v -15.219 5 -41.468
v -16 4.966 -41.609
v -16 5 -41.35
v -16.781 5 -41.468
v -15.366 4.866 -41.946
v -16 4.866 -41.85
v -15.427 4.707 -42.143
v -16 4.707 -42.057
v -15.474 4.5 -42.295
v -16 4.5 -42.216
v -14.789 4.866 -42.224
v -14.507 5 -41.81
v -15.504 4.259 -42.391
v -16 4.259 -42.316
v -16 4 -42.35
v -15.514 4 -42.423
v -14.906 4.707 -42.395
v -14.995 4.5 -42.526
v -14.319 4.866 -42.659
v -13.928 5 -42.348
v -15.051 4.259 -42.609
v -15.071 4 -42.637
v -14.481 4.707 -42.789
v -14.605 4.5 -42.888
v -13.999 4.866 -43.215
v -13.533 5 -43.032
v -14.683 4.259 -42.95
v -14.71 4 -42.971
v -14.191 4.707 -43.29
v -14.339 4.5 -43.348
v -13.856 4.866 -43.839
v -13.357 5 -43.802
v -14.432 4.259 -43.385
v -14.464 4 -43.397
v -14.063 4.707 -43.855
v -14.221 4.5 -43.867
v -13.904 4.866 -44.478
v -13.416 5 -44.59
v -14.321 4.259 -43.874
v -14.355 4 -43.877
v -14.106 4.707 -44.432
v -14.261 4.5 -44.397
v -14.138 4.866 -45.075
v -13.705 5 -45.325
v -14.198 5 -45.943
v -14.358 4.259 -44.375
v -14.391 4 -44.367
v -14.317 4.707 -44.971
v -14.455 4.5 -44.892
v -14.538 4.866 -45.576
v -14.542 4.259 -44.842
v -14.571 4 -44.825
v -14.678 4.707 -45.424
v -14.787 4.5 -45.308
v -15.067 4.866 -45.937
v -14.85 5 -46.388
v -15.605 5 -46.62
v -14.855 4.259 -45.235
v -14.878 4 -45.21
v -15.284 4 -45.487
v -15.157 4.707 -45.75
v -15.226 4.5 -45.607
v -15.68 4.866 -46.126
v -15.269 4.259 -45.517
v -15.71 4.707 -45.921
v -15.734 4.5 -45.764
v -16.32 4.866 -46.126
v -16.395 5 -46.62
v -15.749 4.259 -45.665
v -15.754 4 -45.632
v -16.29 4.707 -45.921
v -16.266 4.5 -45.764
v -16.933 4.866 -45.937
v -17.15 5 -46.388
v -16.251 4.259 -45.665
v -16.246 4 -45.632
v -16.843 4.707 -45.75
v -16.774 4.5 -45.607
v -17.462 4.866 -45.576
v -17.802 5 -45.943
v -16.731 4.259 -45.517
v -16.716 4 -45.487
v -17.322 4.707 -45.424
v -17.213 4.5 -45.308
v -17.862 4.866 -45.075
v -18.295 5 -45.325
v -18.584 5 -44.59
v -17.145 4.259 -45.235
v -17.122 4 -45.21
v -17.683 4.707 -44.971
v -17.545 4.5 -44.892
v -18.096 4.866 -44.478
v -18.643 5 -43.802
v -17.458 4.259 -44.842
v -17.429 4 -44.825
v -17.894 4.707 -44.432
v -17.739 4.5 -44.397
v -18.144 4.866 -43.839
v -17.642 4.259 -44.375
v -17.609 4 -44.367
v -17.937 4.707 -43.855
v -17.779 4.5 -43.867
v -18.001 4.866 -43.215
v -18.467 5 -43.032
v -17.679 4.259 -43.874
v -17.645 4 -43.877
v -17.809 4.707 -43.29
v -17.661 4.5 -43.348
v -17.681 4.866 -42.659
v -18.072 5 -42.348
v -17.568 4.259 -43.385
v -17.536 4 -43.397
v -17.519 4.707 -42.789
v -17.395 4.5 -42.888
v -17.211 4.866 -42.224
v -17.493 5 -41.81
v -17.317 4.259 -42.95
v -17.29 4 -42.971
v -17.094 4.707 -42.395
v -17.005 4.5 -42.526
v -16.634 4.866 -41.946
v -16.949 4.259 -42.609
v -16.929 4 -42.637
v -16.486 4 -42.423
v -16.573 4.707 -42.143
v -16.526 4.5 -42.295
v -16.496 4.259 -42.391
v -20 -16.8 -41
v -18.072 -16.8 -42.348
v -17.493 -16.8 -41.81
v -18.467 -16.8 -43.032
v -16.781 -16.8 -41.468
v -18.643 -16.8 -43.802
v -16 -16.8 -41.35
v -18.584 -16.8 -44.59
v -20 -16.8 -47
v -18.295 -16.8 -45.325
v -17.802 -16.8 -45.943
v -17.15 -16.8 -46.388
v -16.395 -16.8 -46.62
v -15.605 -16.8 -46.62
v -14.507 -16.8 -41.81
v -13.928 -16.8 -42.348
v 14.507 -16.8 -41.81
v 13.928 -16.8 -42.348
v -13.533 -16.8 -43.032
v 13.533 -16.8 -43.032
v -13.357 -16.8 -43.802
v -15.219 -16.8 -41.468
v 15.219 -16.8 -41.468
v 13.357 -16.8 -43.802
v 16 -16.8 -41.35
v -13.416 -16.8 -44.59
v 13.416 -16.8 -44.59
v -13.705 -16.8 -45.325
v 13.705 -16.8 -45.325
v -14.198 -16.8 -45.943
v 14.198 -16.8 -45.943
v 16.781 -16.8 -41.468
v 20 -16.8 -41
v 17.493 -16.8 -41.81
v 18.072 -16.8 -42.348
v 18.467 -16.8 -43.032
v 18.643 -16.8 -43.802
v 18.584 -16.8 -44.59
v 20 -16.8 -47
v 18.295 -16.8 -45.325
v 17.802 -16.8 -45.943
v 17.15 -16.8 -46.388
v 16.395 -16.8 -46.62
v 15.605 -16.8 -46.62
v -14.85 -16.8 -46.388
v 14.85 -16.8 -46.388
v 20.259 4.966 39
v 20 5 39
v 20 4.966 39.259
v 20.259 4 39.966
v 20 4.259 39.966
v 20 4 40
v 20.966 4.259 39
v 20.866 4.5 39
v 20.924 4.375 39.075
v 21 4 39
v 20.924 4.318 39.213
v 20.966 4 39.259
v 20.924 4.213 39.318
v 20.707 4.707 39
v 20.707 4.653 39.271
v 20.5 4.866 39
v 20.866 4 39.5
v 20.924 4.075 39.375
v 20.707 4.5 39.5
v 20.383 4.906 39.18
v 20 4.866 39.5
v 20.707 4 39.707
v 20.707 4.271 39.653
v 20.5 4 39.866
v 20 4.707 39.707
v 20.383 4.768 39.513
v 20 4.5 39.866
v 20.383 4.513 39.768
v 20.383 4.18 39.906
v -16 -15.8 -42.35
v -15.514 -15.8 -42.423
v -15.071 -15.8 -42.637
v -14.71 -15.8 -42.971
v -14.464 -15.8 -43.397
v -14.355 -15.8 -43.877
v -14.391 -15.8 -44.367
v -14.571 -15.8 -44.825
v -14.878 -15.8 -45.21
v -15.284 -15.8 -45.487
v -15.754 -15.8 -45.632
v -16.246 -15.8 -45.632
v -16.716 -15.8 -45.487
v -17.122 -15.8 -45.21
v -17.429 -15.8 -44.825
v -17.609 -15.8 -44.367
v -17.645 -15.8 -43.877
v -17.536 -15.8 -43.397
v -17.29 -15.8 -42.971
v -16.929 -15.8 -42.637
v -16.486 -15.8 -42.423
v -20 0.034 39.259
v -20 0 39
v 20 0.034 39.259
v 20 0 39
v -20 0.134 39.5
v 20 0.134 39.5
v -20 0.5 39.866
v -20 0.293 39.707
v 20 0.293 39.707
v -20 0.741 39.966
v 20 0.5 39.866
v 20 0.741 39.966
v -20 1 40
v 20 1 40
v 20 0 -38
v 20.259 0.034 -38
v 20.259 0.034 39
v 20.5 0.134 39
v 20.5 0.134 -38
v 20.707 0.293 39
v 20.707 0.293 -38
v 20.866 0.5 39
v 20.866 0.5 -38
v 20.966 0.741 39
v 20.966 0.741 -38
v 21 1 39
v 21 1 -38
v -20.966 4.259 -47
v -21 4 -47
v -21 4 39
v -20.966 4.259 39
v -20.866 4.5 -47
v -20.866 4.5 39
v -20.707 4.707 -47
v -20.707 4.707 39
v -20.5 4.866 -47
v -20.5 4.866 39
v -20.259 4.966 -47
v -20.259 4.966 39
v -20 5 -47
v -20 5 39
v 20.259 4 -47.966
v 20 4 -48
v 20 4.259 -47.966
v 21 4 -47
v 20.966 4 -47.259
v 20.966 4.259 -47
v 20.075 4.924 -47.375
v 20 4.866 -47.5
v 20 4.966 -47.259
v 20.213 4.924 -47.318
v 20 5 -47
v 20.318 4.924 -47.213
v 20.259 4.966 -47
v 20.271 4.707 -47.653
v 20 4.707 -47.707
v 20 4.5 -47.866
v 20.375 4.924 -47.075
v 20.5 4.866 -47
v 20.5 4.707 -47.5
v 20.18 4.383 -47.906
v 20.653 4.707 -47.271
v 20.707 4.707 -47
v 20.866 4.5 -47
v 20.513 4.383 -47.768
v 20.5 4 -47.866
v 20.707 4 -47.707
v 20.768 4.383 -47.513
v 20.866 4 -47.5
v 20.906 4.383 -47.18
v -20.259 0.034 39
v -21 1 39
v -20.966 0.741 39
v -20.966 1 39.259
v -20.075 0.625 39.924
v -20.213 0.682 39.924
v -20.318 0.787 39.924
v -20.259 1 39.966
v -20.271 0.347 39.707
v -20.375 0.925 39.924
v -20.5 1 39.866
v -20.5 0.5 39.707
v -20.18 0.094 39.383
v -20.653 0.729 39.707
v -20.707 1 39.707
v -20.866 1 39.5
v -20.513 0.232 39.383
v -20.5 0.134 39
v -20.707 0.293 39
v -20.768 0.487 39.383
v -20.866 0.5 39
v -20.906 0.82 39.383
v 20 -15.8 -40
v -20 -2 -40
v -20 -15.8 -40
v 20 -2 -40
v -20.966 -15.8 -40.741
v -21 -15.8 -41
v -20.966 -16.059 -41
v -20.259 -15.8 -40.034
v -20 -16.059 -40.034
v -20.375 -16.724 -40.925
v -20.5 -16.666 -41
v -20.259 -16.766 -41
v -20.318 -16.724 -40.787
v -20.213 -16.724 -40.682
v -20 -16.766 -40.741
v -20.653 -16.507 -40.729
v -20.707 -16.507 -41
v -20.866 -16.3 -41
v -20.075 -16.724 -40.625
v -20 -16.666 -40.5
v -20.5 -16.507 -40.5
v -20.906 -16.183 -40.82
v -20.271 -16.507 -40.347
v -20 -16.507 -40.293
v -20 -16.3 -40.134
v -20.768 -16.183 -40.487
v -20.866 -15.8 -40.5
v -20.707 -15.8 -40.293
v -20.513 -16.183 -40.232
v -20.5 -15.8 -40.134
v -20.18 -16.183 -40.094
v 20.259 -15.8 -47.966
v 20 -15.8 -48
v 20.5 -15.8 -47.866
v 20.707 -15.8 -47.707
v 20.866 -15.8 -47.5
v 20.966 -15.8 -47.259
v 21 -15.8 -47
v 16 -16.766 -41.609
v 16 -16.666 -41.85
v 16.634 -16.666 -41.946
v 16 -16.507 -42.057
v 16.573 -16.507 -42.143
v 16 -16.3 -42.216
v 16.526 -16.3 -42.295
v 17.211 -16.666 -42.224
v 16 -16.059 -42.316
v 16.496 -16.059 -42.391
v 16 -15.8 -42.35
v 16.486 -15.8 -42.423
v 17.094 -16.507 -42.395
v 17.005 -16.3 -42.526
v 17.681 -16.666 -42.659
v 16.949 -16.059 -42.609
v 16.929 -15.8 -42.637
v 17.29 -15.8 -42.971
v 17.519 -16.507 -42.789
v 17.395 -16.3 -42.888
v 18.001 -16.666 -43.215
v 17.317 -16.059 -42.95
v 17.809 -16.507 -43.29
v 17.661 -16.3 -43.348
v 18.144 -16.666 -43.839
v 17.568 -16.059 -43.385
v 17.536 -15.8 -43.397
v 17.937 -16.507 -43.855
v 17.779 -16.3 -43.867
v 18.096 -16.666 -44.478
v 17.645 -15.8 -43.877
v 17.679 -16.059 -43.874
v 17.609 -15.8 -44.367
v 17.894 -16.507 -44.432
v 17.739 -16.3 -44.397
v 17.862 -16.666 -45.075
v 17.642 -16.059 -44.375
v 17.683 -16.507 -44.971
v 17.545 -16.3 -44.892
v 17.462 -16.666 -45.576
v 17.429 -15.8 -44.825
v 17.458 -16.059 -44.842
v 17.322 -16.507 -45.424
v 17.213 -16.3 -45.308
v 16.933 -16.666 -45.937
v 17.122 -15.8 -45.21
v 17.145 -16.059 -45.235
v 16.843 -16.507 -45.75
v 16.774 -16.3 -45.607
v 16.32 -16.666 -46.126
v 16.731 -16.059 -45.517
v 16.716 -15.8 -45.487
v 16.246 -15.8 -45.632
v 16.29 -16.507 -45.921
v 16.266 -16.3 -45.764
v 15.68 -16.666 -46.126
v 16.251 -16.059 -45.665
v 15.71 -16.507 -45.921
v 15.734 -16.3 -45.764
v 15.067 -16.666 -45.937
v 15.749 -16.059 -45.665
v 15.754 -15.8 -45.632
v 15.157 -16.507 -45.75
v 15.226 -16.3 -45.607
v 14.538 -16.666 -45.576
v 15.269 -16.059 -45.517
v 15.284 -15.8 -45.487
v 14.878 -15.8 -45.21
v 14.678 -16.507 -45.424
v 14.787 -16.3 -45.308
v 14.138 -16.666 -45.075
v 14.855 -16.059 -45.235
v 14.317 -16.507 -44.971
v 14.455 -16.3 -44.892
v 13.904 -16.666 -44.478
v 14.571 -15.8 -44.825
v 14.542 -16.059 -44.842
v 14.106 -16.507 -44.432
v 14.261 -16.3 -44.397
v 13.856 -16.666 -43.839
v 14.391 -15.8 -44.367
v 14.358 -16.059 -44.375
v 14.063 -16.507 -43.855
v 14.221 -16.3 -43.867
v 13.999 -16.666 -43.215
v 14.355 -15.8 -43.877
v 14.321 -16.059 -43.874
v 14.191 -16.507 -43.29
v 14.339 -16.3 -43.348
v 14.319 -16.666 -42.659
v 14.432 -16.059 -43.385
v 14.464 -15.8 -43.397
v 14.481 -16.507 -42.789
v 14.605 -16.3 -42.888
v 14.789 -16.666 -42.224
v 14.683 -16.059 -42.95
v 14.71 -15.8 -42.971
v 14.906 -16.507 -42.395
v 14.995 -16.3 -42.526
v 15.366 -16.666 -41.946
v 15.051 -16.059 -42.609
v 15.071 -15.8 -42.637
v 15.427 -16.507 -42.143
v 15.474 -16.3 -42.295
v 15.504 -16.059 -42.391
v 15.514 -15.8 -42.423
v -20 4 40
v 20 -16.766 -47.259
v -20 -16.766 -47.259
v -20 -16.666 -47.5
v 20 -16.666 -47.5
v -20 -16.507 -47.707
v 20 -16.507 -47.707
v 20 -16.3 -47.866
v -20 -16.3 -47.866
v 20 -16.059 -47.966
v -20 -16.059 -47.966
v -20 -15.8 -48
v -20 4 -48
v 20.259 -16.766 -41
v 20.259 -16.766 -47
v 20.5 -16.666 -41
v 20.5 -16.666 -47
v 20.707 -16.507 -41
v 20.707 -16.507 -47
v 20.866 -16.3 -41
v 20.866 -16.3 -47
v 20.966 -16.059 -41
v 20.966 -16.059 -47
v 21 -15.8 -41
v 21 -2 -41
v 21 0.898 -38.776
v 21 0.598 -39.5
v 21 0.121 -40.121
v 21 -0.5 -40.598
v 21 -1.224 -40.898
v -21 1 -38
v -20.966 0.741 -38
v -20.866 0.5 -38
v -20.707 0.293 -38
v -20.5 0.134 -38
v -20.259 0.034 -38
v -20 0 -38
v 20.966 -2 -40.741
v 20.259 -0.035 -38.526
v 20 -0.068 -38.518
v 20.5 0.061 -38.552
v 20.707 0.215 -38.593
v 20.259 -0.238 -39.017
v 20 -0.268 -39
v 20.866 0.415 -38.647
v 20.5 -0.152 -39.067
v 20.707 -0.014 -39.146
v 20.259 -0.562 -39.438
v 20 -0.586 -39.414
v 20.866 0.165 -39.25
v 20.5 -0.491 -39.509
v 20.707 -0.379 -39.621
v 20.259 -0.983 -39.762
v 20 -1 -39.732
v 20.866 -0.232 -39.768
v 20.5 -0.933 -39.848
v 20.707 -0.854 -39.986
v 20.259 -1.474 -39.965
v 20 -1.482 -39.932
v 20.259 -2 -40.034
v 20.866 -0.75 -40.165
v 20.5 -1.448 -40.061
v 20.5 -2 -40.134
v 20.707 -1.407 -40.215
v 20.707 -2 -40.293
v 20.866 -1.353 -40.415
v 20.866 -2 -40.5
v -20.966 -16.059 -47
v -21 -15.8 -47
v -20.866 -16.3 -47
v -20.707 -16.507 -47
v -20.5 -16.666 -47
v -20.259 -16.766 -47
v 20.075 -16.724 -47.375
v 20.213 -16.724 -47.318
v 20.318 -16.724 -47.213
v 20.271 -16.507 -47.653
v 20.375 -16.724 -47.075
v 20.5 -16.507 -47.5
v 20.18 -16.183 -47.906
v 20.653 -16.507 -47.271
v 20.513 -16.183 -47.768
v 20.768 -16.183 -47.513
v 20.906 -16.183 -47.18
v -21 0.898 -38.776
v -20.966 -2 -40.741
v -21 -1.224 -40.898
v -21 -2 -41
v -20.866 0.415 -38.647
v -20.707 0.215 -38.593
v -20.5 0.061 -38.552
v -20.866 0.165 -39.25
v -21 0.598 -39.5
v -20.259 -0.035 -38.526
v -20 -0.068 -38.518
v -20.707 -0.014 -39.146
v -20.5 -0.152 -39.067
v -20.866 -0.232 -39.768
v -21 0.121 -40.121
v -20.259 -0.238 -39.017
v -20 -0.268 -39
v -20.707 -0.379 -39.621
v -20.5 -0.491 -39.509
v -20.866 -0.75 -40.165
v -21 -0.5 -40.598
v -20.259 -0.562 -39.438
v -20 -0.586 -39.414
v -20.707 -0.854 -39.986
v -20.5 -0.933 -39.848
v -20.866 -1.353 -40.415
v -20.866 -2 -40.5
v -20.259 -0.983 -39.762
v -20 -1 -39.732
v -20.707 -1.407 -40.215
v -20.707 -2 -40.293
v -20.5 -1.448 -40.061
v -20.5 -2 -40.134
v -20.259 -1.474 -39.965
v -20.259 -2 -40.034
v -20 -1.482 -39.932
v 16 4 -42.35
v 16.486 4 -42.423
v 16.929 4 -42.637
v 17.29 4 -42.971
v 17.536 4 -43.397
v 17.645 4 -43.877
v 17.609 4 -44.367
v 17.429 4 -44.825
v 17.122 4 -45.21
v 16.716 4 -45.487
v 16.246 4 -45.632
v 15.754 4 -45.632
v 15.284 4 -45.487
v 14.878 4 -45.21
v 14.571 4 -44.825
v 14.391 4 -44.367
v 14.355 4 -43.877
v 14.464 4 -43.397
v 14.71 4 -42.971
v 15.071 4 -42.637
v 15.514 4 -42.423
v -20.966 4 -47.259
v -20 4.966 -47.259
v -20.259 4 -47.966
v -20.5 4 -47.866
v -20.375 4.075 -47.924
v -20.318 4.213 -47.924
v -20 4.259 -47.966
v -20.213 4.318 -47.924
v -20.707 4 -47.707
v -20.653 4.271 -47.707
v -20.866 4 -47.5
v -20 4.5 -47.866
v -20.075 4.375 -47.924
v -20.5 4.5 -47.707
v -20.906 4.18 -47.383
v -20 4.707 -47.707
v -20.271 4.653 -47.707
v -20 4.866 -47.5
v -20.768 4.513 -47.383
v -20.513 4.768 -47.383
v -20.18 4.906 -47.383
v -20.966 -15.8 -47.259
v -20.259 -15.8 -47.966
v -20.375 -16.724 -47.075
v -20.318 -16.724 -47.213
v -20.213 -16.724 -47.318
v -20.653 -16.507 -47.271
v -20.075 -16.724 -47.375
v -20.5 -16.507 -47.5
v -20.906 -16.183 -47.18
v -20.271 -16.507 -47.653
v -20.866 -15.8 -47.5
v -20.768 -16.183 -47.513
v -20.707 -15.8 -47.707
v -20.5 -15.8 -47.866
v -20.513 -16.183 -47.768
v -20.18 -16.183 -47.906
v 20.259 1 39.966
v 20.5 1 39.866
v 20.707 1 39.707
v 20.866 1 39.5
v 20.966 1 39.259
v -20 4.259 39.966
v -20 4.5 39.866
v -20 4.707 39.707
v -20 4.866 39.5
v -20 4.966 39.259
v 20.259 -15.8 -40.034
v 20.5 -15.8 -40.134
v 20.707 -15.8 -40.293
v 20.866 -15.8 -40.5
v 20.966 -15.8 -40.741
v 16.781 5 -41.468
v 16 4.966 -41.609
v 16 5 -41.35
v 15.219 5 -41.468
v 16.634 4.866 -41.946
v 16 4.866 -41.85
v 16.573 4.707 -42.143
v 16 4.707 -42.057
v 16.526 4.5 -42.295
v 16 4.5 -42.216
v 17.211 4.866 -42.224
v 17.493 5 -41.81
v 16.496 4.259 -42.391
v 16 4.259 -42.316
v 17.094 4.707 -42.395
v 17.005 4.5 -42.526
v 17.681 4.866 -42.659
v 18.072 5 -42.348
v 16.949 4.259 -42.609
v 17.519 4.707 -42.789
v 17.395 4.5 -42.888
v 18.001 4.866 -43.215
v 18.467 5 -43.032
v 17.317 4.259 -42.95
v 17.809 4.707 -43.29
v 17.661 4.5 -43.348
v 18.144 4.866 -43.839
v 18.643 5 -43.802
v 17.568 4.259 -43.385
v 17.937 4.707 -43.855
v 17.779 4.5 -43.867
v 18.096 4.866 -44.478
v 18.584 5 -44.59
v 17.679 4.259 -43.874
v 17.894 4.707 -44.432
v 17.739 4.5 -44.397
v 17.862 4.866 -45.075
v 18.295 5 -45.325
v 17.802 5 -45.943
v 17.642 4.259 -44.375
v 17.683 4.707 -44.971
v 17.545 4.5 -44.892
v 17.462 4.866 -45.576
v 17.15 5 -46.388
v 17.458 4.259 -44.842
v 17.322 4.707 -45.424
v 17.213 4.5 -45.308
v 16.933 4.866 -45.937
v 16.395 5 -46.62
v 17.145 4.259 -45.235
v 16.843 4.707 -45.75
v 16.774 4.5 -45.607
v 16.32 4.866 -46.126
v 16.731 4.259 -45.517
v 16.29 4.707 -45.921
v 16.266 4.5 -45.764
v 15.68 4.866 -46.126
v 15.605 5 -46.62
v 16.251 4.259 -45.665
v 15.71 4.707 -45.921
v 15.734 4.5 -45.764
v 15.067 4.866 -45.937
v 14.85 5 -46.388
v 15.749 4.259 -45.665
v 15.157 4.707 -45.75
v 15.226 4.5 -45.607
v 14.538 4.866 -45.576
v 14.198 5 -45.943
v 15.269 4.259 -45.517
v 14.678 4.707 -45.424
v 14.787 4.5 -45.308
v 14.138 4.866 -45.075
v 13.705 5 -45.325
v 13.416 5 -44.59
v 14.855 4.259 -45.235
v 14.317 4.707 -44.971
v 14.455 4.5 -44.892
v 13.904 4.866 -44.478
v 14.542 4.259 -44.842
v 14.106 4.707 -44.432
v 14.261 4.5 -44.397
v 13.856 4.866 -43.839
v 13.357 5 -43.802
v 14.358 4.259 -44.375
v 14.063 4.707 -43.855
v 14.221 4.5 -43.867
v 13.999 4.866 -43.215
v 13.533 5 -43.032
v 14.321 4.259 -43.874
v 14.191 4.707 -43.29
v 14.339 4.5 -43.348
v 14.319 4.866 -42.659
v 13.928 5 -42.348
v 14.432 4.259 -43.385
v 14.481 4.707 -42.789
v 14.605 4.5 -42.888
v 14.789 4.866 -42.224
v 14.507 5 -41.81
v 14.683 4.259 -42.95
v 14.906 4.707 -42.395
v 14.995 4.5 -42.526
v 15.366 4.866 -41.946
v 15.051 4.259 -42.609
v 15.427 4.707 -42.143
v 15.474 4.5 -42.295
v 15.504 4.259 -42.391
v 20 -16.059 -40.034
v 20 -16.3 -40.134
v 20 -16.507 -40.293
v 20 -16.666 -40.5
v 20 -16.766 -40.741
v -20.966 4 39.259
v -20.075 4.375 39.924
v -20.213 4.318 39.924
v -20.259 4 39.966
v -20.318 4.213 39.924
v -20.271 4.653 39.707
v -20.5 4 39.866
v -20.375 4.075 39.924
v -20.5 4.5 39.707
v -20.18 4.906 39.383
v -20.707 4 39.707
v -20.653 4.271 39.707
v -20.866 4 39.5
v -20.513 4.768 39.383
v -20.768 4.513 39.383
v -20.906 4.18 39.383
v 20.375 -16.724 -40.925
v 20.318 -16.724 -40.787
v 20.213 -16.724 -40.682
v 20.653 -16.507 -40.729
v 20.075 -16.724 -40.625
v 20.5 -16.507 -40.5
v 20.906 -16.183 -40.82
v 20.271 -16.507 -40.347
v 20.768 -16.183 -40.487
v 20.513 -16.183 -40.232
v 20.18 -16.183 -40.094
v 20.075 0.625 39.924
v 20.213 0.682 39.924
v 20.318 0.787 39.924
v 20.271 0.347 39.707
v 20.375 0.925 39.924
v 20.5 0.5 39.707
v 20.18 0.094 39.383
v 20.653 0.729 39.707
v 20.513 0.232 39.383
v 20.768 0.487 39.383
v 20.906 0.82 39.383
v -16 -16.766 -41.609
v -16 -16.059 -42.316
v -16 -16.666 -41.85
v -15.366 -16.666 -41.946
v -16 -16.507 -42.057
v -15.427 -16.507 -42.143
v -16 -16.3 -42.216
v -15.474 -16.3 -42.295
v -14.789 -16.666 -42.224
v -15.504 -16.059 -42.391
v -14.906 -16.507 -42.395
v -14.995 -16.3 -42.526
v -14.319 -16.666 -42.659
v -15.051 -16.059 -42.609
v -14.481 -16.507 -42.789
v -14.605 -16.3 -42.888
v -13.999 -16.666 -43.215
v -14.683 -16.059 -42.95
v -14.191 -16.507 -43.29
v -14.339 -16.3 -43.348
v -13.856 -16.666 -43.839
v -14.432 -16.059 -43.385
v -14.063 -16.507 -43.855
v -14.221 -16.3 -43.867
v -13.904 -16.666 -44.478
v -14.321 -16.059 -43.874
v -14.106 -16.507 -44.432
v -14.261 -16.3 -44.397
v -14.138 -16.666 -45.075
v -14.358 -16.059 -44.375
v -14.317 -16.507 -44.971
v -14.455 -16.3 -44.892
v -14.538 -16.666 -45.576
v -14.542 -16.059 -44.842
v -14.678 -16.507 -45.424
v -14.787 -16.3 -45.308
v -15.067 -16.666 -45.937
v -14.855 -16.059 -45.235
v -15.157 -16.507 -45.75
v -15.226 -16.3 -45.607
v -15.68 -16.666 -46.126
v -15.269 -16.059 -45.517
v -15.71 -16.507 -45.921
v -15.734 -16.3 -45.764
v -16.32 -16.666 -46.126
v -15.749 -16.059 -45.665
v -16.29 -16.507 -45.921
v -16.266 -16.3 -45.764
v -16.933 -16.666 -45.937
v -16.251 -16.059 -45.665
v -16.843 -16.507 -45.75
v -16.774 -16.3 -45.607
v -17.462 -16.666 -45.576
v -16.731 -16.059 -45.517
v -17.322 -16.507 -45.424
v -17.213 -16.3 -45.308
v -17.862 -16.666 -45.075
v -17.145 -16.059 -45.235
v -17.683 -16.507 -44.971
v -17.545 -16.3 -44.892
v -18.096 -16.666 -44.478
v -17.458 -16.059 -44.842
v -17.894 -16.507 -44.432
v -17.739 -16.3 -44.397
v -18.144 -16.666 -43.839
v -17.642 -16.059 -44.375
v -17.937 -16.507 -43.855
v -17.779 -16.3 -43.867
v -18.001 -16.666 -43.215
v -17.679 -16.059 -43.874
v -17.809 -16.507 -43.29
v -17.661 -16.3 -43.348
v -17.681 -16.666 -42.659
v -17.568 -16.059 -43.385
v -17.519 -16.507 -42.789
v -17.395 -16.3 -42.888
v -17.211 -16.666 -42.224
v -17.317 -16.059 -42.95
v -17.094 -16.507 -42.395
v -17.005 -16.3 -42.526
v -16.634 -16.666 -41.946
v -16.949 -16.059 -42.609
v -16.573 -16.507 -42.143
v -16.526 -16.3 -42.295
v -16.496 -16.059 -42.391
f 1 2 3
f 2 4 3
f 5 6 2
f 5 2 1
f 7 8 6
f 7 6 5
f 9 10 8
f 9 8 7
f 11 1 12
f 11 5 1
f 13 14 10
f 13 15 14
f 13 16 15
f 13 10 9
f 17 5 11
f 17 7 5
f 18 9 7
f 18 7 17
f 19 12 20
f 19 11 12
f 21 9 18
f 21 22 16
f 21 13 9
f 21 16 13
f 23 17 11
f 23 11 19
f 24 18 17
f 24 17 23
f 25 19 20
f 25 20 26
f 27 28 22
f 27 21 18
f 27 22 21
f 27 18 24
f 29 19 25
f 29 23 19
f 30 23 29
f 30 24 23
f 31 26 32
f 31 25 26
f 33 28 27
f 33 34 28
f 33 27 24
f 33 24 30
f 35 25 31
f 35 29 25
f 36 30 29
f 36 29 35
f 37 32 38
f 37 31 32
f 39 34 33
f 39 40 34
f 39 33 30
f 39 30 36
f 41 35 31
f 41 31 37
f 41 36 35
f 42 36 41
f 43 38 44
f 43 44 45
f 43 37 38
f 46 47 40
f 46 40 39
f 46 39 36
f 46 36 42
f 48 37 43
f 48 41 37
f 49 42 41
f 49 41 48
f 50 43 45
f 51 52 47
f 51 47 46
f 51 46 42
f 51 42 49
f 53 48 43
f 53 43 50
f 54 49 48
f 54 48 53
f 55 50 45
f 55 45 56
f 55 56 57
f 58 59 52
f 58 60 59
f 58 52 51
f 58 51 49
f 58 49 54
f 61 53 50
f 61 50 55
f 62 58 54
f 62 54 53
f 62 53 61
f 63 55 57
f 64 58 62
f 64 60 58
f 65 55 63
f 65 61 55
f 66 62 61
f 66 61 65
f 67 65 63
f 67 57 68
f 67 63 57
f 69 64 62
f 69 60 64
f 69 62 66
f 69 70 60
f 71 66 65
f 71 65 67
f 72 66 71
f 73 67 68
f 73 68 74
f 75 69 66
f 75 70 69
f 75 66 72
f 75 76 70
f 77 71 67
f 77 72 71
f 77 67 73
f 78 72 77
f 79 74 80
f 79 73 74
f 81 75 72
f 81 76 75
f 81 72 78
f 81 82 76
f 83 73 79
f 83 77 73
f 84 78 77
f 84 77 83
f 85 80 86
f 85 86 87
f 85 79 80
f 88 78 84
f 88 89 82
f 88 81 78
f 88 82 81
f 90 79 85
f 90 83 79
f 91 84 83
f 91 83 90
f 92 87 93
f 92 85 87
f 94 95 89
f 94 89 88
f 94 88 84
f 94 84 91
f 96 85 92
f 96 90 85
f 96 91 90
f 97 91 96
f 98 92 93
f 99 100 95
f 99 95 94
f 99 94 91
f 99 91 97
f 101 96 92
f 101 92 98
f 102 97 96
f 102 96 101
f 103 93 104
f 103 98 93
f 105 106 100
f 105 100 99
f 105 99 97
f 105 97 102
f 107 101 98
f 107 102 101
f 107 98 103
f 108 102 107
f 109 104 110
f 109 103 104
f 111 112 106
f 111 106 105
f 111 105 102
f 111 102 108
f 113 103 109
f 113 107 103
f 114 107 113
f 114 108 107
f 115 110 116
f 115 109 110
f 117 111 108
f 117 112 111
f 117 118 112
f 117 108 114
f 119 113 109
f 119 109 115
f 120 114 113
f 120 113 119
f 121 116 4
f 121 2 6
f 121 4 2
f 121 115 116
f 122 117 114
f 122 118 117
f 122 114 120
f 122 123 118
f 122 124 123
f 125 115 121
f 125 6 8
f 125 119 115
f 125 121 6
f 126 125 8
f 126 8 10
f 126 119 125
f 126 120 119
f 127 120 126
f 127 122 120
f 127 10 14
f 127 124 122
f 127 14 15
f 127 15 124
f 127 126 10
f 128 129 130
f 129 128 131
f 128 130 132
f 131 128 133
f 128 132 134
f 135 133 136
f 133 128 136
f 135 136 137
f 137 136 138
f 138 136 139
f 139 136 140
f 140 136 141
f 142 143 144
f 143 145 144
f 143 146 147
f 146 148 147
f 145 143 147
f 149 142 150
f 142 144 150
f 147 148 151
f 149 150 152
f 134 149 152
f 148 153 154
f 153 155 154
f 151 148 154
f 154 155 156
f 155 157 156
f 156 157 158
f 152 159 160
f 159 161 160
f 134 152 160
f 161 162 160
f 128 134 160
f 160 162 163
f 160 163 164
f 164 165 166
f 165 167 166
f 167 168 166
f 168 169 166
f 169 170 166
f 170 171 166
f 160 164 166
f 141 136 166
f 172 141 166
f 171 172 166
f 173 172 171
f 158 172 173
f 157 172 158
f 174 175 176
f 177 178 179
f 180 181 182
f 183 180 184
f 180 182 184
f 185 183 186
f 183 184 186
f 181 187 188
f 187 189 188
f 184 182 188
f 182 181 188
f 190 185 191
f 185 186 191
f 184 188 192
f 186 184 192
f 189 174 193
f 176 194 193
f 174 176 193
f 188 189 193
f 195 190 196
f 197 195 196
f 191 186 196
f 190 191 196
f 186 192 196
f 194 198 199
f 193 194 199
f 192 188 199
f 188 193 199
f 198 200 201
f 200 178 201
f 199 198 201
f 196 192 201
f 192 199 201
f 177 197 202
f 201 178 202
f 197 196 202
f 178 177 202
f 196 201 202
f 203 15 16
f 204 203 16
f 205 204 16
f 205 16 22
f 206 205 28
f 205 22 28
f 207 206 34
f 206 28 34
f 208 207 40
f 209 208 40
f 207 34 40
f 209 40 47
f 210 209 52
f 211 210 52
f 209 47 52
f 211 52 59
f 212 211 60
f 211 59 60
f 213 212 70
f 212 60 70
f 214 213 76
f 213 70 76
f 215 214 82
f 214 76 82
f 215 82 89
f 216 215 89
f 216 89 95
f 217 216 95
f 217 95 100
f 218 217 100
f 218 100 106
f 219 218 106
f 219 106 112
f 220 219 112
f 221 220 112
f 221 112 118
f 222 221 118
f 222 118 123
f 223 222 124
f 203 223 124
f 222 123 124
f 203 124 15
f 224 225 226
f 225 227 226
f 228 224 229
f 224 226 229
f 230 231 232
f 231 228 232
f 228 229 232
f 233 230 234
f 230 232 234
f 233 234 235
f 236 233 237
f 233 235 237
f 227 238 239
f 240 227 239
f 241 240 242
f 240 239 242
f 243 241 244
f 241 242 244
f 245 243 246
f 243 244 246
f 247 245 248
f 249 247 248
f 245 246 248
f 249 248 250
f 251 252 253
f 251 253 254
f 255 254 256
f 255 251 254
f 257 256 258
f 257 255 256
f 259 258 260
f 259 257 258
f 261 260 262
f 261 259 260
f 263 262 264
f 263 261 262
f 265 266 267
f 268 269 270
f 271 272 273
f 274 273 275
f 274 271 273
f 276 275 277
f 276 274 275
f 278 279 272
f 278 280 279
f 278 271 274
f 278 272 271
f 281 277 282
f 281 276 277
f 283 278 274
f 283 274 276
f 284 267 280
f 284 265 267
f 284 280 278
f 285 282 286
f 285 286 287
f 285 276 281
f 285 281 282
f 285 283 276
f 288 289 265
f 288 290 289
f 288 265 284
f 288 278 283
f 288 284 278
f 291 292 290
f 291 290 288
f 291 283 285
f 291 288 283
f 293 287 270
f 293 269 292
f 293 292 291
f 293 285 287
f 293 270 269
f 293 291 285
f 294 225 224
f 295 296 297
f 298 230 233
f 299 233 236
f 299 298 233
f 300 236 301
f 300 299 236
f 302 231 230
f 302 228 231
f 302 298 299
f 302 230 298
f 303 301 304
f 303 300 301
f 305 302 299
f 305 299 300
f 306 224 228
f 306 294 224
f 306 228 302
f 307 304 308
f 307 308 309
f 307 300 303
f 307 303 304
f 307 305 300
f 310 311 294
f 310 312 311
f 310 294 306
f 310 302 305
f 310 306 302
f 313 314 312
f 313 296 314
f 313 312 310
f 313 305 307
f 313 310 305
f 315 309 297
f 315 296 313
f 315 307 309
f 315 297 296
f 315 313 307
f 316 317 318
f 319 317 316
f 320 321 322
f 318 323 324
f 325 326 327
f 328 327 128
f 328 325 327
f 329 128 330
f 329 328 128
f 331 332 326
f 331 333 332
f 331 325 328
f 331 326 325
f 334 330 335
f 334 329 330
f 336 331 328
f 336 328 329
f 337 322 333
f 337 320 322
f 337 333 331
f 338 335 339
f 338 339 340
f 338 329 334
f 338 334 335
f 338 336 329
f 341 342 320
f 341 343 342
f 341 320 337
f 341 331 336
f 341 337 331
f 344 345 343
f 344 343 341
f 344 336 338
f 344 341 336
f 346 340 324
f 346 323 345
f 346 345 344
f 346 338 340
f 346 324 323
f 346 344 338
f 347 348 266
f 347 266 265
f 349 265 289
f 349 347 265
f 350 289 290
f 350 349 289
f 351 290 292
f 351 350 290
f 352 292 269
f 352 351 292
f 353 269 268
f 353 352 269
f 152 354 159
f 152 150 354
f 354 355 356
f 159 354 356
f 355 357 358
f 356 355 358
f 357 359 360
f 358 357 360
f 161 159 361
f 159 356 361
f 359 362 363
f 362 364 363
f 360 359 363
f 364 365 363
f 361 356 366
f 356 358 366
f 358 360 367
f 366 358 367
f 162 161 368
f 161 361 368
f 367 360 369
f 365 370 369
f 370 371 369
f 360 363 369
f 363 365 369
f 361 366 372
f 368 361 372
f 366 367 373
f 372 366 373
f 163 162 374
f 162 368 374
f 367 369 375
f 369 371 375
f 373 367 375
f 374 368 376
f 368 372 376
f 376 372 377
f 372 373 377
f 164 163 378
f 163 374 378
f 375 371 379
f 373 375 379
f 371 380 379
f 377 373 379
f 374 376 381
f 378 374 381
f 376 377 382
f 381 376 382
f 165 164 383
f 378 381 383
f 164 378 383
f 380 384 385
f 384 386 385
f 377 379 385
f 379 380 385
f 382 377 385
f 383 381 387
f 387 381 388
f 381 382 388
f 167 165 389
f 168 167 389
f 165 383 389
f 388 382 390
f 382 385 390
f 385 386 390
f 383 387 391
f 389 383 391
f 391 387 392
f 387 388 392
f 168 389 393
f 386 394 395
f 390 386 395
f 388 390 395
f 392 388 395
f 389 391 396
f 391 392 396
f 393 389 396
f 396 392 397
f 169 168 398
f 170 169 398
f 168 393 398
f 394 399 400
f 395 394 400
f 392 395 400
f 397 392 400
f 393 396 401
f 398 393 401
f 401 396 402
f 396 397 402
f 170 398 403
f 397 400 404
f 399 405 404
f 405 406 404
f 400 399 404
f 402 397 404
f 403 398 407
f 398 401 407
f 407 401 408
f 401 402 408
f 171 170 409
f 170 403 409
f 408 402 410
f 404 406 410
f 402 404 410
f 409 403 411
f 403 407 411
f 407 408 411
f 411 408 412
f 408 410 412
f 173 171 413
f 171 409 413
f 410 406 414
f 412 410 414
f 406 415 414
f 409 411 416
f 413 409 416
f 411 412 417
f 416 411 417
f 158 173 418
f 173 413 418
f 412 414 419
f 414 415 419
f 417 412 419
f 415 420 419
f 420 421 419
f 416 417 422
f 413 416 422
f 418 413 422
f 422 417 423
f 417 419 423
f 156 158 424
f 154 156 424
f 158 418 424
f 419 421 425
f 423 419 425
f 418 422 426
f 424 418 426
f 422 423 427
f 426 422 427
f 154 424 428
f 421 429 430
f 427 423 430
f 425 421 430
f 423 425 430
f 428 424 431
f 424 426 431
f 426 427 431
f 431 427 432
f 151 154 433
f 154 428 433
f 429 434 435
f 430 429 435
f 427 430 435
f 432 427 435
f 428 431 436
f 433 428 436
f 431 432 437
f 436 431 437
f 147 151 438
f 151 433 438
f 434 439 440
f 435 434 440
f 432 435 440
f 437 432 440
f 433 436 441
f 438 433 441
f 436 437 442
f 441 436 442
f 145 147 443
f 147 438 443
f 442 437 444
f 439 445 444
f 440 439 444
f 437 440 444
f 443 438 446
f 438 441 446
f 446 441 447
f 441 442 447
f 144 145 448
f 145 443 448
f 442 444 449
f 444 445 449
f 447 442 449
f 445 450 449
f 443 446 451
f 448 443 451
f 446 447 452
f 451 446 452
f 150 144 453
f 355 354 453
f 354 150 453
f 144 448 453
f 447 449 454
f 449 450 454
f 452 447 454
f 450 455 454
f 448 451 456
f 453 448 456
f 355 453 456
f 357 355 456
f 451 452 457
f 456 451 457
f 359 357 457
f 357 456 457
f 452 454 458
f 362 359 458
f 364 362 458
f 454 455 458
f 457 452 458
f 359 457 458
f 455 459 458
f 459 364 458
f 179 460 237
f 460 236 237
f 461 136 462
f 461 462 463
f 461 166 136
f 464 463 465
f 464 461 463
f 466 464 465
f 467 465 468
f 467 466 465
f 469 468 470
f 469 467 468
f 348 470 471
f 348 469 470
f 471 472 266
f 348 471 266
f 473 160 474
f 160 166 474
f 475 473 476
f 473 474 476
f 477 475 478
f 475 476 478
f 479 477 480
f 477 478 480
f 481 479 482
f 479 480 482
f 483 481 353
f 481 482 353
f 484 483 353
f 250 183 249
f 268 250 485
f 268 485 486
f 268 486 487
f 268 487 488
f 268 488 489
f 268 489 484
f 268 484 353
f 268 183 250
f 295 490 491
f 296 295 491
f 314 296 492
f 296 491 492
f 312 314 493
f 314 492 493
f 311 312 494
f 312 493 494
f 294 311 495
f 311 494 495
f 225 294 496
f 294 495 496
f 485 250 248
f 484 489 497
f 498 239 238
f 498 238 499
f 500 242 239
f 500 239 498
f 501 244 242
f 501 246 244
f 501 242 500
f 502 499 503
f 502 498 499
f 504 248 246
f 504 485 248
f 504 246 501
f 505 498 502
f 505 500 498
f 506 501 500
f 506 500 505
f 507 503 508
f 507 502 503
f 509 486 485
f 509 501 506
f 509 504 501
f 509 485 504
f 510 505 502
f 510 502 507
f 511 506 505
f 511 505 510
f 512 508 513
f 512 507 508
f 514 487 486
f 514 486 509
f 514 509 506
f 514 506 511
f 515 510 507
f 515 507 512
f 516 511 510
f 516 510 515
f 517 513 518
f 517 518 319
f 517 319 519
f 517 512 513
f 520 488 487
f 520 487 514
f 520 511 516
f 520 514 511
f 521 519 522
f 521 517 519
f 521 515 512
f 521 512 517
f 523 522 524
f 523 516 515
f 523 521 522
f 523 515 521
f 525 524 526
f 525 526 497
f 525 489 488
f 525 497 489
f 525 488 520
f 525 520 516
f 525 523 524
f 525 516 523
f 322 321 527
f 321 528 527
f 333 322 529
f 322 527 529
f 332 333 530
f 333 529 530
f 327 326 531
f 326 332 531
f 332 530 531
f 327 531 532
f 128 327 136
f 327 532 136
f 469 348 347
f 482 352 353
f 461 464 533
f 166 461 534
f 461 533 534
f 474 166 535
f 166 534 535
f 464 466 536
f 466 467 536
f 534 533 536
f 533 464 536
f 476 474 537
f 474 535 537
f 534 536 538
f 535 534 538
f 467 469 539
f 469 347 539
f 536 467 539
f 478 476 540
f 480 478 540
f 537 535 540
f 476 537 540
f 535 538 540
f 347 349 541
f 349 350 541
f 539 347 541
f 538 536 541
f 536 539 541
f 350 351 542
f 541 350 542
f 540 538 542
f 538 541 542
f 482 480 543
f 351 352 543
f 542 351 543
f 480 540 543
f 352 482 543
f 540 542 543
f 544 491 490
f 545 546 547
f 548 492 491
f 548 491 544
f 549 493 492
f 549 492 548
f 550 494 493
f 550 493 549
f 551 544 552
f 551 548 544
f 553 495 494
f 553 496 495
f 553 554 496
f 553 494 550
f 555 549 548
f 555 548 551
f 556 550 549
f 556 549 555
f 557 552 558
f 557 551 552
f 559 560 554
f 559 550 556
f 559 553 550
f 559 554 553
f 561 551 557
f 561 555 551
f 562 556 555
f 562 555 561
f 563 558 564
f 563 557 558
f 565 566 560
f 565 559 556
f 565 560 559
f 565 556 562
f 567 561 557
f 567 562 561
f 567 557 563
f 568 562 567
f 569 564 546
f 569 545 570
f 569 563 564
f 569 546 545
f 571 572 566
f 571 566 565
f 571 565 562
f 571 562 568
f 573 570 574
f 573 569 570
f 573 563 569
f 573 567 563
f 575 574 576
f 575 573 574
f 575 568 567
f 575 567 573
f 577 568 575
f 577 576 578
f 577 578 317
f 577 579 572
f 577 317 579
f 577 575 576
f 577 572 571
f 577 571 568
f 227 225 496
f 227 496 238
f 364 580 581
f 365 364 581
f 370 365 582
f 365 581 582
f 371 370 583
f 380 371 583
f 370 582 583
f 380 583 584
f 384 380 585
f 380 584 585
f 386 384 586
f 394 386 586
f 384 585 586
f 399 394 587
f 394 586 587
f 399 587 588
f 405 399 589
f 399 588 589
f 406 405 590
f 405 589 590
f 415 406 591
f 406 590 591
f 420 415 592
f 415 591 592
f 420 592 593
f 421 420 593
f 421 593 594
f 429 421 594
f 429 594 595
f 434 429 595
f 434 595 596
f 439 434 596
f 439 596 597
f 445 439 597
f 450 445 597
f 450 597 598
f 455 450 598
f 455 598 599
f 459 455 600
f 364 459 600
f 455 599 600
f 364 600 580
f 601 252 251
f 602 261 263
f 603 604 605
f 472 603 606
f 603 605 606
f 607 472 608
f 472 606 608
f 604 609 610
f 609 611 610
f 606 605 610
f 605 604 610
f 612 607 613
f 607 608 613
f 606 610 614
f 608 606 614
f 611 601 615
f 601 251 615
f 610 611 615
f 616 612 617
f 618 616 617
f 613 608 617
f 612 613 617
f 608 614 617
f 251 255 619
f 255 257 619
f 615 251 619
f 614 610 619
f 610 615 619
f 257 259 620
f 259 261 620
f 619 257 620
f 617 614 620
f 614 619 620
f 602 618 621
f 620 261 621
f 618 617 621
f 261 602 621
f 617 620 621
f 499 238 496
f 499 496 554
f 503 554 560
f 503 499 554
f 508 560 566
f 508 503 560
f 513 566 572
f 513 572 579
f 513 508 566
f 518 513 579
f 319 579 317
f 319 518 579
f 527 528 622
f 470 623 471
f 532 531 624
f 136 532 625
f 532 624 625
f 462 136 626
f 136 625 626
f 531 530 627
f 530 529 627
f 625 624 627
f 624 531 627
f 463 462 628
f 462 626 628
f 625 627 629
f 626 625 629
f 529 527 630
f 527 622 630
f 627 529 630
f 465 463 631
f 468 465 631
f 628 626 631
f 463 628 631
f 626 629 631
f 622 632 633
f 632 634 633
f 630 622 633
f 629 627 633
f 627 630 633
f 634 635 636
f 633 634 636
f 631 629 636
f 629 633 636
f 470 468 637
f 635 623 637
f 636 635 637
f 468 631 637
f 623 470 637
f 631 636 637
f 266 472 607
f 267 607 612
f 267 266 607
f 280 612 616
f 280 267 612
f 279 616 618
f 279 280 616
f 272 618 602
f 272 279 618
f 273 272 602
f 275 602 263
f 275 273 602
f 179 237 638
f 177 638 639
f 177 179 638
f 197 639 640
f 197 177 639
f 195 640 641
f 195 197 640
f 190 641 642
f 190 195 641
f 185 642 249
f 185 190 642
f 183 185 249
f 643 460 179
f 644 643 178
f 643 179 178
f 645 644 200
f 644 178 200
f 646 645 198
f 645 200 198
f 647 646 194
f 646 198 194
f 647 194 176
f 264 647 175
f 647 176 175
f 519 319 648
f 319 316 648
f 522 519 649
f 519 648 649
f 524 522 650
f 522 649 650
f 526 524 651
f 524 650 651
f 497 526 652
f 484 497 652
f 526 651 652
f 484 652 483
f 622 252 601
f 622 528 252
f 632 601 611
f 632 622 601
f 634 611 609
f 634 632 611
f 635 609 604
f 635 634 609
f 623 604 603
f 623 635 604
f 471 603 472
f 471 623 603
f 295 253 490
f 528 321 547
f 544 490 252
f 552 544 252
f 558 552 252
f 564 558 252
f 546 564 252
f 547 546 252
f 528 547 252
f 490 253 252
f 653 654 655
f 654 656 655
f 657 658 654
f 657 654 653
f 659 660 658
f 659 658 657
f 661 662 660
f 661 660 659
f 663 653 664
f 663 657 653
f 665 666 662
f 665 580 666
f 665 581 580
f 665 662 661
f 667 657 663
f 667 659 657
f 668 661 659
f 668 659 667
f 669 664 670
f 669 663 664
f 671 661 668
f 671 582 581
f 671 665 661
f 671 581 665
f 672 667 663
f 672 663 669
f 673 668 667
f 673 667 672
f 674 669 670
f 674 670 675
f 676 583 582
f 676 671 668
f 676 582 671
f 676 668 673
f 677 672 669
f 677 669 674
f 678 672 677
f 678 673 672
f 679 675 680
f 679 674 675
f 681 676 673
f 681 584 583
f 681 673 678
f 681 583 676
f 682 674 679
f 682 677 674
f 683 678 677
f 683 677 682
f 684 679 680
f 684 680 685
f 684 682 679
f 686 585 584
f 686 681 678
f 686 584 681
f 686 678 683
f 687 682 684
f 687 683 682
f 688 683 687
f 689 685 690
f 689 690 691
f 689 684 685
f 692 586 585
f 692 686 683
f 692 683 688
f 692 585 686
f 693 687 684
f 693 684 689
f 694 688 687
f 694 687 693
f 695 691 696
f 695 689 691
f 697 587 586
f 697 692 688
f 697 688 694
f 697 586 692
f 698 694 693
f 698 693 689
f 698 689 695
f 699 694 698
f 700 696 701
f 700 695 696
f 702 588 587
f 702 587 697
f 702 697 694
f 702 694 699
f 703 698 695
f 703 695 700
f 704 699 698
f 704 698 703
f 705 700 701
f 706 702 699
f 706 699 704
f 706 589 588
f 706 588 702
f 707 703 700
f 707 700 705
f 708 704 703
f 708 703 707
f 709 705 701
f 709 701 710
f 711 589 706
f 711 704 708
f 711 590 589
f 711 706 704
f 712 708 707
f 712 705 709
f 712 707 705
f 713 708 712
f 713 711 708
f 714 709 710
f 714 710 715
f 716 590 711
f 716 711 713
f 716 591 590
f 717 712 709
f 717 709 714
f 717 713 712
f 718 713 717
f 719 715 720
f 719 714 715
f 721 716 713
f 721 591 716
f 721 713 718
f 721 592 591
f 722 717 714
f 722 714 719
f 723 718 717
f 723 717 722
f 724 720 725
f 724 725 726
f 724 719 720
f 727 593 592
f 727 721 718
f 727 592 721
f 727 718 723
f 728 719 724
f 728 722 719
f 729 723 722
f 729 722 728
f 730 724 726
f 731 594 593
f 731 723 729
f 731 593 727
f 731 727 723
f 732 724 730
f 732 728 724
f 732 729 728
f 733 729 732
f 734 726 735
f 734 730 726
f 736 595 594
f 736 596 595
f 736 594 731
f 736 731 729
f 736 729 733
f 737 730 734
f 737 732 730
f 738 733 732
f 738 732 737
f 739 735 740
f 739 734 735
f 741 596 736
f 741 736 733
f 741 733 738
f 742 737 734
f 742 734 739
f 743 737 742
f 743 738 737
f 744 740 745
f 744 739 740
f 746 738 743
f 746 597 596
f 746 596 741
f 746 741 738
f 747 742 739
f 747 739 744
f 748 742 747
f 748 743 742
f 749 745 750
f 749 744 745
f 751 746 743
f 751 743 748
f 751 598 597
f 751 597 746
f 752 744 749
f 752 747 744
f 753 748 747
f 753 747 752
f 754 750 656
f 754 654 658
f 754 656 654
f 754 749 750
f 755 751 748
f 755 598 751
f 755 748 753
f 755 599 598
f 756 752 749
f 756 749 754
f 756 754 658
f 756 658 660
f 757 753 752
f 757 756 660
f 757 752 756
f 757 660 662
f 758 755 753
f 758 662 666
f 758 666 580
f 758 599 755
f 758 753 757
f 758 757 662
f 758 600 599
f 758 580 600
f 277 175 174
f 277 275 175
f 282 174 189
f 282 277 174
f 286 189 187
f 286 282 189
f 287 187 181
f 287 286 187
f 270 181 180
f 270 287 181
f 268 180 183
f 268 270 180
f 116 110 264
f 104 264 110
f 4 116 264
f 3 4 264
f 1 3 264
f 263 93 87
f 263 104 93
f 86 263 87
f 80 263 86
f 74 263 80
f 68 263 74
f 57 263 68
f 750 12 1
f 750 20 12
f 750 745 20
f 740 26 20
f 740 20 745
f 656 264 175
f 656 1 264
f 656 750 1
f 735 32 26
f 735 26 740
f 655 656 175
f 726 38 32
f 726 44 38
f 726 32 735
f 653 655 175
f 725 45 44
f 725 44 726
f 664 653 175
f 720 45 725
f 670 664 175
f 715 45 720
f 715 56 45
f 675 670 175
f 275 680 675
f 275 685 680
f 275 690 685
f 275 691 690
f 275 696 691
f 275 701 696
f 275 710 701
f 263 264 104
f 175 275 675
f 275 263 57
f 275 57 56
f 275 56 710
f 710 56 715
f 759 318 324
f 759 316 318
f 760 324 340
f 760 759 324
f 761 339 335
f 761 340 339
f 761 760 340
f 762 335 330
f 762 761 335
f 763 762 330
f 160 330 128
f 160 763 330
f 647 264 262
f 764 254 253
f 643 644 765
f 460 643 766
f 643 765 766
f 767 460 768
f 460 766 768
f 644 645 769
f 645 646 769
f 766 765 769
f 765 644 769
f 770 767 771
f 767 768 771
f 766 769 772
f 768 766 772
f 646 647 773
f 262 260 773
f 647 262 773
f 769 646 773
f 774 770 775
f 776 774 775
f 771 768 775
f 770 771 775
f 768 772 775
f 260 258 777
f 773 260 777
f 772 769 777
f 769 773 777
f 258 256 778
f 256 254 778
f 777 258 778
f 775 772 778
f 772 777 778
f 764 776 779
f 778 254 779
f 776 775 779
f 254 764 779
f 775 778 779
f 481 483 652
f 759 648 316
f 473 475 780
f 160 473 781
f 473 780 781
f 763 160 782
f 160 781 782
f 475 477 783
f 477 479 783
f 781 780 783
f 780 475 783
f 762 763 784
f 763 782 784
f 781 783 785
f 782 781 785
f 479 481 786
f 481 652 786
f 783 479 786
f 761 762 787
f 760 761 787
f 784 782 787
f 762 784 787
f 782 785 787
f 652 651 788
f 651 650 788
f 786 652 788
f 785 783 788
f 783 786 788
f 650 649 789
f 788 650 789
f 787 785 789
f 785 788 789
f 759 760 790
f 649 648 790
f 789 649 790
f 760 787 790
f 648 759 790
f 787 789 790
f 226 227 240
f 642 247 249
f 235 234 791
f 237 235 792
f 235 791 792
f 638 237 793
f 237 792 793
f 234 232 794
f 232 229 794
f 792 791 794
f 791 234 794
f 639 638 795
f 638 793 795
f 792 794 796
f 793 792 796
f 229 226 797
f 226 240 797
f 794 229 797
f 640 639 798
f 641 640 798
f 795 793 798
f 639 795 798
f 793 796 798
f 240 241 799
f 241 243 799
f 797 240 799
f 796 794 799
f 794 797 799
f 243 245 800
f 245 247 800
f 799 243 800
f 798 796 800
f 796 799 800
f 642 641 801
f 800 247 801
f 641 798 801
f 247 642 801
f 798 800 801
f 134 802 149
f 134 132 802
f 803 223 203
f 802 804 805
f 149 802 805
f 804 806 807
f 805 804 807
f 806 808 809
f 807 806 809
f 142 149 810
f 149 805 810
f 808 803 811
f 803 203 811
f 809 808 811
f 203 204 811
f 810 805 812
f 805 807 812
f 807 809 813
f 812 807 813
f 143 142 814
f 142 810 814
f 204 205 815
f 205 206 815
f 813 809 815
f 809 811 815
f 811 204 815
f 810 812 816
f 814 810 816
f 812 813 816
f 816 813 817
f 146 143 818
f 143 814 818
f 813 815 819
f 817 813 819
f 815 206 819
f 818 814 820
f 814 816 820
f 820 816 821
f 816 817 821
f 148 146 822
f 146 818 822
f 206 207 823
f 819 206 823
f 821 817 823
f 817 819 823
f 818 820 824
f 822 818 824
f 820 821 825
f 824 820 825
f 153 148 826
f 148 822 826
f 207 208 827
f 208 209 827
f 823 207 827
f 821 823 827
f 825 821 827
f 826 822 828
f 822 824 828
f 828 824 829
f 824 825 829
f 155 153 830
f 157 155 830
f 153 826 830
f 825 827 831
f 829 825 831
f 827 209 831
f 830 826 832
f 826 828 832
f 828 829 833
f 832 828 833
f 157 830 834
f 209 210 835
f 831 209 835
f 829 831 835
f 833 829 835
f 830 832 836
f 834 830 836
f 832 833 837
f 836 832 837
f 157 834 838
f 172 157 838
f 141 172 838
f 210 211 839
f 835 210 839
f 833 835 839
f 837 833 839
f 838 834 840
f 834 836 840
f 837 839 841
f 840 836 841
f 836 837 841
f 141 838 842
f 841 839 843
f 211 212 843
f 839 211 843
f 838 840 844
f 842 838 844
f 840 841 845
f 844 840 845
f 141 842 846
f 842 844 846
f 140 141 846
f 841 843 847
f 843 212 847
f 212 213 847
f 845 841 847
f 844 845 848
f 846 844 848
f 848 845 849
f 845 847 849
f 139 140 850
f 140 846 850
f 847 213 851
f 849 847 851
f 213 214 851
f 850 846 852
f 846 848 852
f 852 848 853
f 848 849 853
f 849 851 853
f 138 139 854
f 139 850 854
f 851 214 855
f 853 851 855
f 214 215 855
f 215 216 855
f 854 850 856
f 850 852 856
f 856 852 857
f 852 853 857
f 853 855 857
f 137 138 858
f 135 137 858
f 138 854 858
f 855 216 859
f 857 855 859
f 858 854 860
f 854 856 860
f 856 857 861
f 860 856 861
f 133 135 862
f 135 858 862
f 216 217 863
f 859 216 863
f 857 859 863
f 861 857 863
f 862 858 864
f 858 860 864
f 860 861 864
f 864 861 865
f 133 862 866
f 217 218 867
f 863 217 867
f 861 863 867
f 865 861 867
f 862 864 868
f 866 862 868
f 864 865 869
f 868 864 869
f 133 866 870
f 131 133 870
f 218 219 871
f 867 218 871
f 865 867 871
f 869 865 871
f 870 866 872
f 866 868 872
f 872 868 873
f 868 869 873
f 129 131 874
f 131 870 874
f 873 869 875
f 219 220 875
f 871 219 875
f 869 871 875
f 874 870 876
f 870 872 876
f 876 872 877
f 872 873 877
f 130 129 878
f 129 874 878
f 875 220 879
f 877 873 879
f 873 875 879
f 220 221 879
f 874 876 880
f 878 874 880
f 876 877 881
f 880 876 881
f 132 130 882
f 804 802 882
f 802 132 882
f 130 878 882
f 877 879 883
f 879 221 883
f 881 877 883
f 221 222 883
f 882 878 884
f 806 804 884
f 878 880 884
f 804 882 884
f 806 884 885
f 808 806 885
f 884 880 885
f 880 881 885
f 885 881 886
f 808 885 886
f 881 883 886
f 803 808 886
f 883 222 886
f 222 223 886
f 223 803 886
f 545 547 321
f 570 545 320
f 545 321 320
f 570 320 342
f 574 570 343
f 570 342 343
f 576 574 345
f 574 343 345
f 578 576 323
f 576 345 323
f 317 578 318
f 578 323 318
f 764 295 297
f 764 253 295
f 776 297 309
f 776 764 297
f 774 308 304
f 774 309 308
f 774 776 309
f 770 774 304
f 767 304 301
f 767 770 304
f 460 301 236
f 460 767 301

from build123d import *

# Parameters (mm, degrees)
SKETCH1_W           = 42
SKETCH1_H           = 80
BOSS_EXTRUDE1_DEPTH = 5
SKETCH2_W           = 42
SKETCH2_H           = 8
SKETCH2_R           = 1.65
BOSS_EXTRUDE2_DEPTH = 21.8
FILLET1_R           = 2
FILLET2_R           = 1


with BuildPart() as part:
    # Sketch1 → Boss-Extrude1 (new body)
    with BuildSketch(Plane(origin=(0, 0, 0), x_dir=(1, 0, 0), z_dir=(0, 1, 0))):
        Rectangle(SKETCH1_W, SKETCH1_H)
    extrude(amount=BOSS_EXTRUDE1_DEPTH)

    # Sketch2 → Boss-Extrude2 (add)
    with BuildSketch(Plane(origin=(0, 5, 0), x_dir=(1, 0, 0), z_dir=(0, 1, 0))):
        with Locations((0, 44)):
            Rectangle(SKETCH2_W, SKETCH2_H)
        with Locations(Location((16, 44, 0), (0, 0, 270))):
            Circle(SKETCH2_R, mode=Mode.SUBTRACT)
        with Locations(Location((-16, 44, 0), (0, 0, 270))):
            Circle(SKETCH2_R, mode=Mode.SUBTRACT)
    extrude(amount=-BOSS_EXTRUDE2_DEPTH)

    # Fillet1
    fillet1_edges = [part.edges().sort_by_distance(p)[0] for p in [
        (0, 0, -40),
    ]]
    fillet(fillet1_edges, radius=FILLET1_R)

    # Fillet2
    fillet2_edges = [part.edges().sort_by_distance(p)[0] for p in [
        (-21, 5, -4),
        (21, -9.4, -40),
        (21, -5.9, -48),
        (-21, -5.9, -48),
        (-21, -9.4, -40),
        (16, -16.8, -45.65),
        (16, 5, -45.65),
        (0, 5, -48),
        (-16, -16.8, -45.65),
        (-16, 5, -45.65),
        (0, 5, 40),
        (-21, -16.8, -44),
        (0, -16.8, -48),
        (21, -16.8, -44),
        (0, -16.8, -40),
        (-21, 0, 1),
        (-21, -0.585786438, -39.414213562),
        (21, -0.585786438, -39.414213562),
        (21, 5, -4),
        (0, 0, 40),
        (21, 0, 1),
        (21, 2.5, 40),
        (-21, 2.5, 40),
    ]]
    fillet(fillet2_edges, radius=FILLET2_R)


solid = part.part
